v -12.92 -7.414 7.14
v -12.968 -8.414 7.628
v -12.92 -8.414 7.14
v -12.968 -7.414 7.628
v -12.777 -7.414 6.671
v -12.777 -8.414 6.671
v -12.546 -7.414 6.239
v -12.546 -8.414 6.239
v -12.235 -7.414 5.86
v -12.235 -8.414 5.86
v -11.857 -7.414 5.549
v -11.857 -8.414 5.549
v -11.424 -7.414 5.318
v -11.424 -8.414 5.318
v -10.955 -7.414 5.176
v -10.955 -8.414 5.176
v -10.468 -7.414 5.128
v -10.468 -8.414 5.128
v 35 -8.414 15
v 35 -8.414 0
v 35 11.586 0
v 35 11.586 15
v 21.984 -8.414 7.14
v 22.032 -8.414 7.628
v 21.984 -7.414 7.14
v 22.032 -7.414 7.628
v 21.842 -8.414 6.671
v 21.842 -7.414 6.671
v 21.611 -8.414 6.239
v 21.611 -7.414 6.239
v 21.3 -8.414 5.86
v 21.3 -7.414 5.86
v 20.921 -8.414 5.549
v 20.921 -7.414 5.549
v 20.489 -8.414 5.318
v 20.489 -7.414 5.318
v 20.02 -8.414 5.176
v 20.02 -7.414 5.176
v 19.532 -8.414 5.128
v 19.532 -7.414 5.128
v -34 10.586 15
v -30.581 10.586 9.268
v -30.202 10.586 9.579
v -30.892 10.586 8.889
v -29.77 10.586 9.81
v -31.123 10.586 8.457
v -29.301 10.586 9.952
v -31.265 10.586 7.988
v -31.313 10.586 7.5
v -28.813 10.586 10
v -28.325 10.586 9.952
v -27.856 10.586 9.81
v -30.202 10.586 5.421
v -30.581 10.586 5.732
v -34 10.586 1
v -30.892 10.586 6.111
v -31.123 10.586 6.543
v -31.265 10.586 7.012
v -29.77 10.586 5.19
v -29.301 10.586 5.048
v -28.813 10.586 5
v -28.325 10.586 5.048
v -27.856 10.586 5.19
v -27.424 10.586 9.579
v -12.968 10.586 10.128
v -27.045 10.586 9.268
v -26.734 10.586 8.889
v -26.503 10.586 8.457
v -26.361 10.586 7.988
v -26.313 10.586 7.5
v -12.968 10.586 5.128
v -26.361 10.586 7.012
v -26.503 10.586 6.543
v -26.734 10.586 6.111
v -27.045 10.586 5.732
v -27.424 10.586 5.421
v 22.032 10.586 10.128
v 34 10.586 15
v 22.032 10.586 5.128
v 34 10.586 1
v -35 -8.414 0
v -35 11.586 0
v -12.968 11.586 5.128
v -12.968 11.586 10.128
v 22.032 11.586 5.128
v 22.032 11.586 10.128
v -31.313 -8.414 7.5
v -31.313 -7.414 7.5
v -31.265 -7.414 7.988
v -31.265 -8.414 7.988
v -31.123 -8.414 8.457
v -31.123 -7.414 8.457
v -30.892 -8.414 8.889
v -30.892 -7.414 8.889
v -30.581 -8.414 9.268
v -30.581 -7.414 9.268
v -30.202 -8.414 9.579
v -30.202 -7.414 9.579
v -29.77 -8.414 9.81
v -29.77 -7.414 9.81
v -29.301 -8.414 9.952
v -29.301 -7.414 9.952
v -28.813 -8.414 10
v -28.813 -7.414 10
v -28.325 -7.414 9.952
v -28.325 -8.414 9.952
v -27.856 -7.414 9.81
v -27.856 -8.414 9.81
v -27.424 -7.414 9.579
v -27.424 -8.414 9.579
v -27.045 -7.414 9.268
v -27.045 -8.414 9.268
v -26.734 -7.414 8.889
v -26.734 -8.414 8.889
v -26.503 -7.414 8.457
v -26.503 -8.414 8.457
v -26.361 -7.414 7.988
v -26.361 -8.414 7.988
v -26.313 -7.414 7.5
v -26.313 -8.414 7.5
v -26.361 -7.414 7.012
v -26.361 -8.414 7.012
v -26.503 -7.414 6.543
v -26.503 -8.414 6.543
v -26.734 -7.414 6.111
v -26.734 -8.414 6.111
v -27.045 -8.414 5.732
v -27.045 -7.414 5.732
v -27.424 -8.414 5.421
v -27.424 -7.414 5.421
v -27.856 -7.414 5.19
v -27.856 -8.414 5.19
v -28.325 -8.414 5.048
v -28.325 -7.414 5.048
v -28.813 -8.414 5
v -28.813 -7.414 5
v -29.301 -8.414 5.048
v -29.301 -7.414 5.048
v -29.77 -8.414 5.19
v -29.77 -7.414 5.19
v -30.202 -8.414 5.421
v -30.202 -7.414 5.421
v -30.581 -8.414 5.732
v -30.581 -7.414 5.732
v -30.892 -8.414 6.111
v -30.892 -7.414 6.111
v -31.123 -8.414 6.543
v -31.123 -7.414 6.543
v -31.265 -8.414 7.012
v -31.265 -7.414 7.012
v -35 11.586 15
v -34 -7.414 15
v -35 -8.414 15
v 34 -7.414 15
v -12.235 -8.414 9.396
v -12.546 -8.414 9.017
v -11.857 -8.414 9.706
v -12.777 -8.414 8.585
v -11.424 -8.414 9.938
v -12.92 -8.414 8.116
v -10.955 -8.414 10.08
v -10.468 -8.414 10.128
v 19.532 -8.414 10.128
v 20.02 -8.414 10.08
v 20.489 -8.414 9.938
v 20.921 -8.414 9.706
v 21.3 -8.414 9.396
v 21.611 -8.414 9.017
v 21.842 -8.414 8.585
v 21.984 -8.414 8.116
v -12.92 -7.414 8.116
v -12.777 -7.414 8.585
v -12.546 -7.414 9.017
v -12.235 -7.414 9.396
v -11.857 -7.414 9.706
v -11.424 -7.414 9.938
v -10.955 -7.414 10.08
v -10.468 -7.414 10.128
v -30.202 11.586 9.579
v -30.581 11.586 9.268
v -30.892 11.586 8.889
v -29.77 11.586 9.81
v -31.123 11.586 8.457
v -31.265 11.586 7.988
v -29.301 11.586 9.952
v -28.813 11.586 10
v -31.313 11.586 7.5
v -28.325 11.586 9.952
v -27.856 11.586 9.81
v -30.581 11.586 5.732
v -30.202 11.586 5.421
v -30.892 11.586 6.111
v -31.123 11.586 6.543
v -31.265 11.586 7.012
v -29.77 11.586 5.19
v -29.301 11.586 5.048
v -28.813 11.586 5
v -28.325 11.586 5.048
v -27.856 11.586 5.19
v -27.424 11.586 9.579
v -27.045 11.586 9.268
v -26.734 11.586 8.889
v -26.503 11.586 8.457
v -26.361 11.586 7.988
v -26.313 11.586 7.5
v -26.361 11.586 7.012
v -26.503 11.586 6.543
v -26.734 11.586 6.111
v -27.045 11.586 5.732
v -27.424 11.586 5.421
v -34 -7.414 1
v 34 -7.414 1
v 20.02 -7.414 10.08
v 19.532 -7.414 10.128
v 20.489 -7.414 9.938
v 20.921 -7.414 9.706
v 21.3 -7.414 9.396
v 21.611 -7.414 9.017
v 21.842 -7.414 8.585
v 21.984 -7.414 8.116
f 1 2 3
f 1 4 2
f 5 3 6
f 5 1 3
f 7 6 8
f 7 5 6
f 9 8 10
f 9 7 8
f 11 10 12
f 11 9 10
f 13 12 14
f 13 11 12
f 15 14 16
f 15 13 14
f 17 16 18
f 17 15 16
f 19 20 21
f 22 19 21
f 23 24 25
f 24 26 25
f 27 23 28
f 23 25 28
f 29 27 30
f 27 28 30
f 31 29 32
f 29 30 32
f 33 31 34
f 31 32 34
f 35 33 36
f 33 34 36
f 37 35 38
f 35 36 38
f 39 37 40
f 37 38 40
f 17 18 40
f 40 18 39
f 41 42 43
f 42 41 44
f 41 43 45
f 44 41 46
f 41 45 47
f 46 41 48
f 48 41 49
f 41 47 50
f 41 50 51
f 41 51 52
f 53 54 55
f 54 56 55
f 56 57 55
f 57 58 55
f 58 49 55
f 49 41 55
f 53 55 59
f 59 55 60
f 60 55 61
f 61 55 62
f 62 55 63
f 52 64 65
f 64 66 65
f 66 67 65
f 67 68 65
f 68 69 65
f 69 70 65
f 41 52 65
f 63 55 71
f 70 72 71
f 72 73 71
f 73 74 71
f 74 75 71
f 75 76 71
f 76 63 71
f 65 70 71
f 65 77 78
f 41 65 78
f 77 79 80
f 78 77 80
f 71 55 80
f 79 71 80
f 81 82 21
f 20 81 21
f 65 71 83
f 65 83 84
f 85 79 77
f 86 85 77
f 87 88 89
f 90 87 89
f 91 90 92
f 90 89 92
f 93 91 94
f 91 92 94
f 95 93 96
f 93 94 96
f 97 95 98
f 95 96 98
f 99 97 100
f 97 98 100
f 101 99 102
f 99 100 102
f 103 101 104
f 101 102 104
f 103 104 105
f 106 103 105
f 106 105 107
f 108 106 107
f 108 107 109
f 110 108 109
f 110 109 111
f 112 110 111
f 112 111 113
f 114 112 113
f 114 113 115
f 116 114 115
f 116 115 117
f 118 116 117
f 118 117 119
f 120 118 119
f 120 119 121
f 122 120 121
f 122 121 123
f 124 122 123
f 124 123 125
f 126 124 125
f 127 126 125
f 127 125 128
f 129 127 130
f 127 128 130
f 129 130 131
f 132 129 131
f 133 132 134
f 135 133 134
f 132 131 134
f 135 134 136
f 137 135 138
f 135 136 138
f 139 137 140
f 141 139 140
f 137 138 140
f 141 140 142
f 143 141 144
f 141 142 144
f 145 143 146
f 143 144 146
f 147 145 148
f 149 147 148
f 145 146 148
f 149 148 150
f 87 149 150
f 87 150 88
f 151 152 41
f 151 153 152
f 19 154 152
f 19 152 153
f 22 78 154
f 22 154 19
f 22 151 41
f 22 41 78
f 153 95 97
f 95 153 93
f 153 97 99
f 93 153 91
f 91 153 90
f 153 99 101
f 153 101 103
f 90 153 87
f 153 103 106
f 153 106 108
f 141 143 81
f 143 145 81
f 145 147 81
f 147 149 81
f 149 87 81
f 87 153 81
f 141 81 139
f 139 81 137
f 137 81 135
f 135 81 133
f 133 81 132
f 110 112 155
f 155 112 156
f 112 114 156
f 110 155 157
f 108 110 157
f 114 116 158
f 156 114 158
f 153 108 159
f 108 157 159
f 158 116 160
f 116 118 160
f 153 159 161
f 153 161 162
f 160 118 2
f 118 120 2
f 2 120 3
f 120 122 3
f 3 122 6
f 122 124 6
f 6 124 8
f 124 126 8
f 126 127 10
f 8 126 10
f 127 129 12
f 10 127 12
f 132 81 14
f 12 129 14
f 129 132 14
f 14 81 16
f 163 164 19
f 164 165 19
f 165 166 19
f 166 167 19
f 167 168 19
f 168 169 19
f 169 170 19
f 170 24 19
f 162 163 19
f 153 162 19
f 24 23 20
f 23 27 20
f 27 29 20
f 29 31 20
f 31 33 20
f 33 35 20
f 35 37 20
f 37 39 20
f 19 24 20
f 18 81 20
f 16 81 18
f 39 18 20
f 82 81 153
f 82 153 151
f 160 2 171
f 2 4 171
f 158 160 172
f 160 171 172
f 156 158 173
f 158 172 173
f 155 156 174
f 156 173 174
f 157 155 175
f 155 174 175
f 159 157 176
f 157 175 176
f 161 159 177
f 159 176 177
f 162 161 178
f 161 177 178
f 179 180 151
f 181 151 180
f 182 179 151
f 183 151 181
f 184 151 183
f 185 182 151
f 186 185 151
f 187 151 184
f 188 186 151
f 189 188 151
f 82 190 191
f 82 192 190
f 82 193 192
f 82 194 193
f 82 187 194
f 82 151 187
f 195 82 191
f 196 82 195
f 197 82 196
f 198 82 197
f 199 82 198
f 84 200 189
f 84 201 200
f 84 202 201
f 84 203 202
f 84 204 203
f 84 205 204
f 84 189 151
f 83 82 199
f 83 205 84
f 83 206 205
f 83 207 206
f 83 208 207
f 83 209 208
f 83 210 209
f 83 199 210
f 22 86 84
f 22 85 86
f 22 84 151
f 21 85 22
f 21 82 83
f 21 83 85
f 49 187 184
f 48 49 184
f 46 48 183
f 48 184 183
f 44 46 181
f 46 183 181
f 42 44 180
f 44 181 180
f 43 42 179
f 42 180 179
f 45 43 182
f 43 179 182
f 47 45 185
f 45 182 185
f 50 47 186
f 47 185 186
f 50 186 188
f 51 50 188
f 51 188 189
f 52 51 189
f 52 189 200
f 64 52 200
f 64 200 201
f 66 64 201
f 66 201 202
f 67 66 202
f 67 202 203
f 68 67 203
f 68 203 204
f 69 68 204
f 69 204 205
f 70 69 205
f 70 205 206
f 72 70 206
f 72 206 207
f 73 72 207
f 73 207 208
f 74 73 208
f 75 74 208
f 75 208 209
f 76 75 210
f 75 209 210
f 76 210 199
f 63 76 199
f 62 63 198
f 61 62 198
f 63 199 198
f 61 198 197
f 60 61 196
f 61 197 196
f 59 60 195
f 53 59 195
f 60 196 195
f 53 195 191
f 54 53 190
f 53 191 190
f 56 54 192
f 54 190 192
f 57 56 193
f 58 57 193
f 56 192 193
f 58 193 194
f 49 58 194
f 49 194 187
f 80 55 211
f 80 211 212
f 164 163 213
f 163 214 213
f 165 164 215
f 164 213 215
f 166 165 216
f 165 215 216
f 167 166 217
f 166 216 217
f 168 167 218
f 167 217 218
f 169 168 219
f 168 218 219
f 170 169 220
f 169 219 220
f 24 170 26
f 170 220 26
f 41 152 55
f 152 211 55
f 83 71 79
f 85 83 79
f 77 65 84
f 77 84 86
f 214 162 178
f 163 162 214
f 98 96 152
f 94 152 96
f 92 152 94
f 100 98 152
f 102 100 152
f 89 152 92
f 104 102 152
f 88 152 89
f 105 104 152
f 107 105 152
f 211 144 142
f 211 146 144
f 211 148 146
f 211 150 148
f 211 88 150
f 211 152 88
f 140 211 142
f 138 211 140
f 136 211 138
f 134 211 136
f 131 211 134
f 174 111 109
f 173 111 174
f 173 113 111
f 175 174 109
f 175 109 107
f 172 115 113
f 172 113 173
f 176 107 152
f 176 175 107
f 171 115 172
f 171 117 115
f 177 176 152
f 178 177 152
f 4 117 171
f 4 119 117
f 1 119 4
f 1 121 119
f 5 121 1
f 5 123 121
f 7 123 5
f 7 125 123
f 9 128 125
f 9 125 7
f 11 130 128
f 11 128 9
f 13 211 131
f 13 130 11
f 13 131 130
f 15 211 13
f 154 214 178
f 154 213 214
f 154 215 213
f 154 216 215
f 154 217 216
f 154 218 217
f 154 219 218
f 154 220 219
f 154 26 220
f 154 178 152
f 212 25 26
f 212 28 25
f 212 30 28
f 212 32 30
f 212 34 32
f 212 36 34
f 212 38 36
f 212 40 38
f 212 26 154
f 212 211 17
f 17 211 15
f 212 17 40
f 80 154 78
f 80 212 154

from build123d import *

# Parameters (mm, degrees)
F0_W     = 70
F0_H     = 20
F1_DEPTH = 15
F3_T     = -1
F4_D     = 5
F2_W     = 35
F2_H     = 5
F5_DEPTH = 25
F6_R     = 2.49999


# Not quite as in the source:
# - a fillet or chamfer is up to 0.001 mm smaller than in the source, because OpenCascade refuses the exact size


with BuildPart() as f1:
    # F0 (on Top) → F1 (new body)
    with BuildSketch(Plane.XY):
        with Locations((0, 1.5861968277)):
            Rectangle(F0_W, F0_H)
    extrude(amount=F1_DEPTH)

    # F3
    f3_openings = [f1.faces().sort_by_distance(p)[0] for p in [
        (0, 1.586197, 15),
    ]]
    offset(amount=F3_T, openings=f3_openings)

    # F4 (through all)
    with Locations(Plane.XZ.offset(8.4138031723)):
        with Locations((-28.8131628186, 7.5)):
            Hole(F4_D / 2)

    # F2 (on face) → F5 (cut)
    with BuildSketch(Plane.XZ.offset(8.4138031723)):
        with Locations((4.5323091745, 7.627816461)):
            Rectangle(F2_W, F2_H)
    extrude(amount=-F5_DEPTH, mode=Mode.SUBTRACT)

    # F6 (radius 2.5 in the source; OpenCascade refuses exactly that, so slightly less here)
    f6_edges = [f1.edges().sort_by_distance(p)[0] for p in [
        (-12.967691, -7.913803, 10.127816),
        (-12.967691, -7.913803, 5.127816),
        (22.032309, -7.913803, 5.127816),
        (22.032309, -7.913803, 10.127816),
    ]]
    fillet(f6_edges, radius=F6_R)


solid = f1.part
